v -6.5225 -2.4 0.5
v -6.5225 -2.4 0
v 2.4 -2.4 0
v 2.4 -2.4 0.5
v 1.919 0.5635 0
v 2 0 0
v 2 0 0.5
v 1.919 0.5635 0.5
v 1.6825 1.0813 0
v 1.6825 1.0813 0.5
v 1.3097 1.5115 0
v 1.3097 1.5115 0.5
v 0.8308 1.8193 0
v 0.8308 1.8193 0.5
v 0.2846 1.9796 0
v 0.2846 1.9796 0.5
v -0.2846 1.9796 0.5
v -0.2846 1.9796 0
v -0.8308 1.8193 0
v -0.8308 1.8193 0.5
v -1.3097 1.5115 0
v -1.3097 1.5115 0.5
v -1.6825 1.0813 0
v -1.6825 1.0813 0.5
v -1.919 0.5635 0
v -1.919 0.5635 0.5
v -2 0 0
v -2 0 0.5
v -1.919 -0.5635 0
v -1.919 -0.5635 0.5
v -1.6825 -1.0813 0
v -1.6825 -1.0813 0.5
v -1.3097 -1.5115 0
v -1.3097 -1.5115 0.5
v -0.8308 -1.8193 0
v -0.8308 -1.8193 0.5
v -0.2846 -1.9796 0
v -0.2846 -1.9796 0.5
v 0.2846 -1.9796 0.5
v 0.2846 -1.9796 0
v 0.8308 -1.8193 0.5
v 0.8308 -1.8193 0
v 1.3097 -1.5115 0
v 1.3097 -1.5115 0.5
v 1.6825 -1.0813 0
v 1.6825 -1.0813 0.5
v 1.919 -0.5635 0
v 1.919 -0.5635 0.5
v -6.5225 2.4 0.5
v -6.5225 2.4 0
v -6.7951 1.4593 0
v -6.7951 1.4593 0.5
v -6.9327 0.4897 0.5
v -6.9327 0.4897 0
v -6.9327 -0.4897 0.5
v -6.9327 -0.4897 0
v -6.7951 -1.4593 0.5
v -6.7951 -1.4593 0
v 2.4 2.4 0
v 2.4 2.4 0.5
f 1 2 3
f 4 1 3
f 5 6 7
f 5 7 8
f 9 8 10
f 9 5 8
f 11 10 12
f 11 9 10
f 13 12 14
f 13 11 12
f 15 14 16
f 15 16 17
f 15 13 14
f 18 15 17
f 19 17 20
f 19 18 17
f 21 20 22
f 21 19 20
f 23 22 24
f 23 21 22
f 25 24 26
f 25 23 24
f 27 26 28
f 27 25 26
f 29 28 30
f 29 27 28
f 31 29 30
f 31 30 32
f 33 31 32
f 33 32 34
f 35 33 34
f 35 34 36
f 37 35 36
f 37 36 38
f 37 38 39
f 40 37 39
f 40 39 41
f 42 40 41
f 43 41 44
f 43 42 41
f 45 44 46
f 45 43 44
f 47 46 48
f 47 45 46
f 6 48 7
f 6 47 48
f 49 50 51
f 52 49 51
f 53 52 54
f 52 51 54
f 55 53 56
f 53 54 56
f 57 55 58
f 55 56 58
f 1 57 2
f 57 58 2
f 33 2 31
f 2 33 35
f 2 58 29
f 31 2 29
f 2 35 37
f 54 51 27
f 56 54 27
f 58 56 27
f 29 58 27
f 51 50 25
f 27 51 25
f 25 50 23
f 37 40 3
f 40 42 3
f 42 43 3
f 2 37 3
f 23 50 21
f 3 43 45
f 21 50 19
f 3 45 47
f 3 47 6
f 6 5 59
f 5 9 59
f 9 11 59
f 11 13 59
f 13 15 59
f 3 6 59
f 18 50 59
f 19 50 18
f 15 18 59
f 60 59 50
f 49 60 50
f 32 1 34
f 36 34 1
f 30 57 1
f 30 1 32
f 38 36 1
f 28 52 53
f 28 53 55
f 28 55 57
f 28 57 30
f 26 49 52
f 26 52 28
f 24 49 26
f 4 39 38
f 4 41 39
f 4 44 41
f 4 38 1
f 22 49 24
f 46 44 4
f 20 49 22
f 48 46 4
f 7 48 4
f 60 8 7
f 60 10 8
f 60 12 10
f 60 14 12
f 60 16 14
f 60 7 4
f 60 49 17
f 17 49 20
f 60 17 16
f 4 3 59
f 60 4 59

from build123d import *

# Parameters (mm, degrees)
F0_R     = 2
F1_DEPTH = 0.5


with BuildPart() as f1:
    # F0 (on Top) → F1 (new body)
    with BuildSketch(Plane.XY):
        with BuildLine():
            Line((-5.986860613, 2.4), (-6.5224611919, 2.4))
            ThreePointArc((-6.5224611919, 2.4), (-6.95, 0), (-6.5224611919, -2.4))
            Line((-6.5224611919, -2.4), (-5.986860613, -2.4))
            ThreePointArc((-5.986860613, -2.4), (-6.45, 0), (-5.986860613, 2.4))
        make_face()
        with BuildLine():
            Line((2.4, -2.4), (2.4, 2.4))
            Line((2.4, 2.4), (-5.986860613, 2.4))
            ThreePointArc((-5.986860613, 2.4), (-6.45, 0), (-5.986860613, -2.4))
            Line((-5.986860613, -2.4), (2.4, -2.4))
        make_face()
        Circle(F0_R, mode=Mode.SUBTRACT)
    extrude(amount=F1_DEPTH)


solid = f1.part
